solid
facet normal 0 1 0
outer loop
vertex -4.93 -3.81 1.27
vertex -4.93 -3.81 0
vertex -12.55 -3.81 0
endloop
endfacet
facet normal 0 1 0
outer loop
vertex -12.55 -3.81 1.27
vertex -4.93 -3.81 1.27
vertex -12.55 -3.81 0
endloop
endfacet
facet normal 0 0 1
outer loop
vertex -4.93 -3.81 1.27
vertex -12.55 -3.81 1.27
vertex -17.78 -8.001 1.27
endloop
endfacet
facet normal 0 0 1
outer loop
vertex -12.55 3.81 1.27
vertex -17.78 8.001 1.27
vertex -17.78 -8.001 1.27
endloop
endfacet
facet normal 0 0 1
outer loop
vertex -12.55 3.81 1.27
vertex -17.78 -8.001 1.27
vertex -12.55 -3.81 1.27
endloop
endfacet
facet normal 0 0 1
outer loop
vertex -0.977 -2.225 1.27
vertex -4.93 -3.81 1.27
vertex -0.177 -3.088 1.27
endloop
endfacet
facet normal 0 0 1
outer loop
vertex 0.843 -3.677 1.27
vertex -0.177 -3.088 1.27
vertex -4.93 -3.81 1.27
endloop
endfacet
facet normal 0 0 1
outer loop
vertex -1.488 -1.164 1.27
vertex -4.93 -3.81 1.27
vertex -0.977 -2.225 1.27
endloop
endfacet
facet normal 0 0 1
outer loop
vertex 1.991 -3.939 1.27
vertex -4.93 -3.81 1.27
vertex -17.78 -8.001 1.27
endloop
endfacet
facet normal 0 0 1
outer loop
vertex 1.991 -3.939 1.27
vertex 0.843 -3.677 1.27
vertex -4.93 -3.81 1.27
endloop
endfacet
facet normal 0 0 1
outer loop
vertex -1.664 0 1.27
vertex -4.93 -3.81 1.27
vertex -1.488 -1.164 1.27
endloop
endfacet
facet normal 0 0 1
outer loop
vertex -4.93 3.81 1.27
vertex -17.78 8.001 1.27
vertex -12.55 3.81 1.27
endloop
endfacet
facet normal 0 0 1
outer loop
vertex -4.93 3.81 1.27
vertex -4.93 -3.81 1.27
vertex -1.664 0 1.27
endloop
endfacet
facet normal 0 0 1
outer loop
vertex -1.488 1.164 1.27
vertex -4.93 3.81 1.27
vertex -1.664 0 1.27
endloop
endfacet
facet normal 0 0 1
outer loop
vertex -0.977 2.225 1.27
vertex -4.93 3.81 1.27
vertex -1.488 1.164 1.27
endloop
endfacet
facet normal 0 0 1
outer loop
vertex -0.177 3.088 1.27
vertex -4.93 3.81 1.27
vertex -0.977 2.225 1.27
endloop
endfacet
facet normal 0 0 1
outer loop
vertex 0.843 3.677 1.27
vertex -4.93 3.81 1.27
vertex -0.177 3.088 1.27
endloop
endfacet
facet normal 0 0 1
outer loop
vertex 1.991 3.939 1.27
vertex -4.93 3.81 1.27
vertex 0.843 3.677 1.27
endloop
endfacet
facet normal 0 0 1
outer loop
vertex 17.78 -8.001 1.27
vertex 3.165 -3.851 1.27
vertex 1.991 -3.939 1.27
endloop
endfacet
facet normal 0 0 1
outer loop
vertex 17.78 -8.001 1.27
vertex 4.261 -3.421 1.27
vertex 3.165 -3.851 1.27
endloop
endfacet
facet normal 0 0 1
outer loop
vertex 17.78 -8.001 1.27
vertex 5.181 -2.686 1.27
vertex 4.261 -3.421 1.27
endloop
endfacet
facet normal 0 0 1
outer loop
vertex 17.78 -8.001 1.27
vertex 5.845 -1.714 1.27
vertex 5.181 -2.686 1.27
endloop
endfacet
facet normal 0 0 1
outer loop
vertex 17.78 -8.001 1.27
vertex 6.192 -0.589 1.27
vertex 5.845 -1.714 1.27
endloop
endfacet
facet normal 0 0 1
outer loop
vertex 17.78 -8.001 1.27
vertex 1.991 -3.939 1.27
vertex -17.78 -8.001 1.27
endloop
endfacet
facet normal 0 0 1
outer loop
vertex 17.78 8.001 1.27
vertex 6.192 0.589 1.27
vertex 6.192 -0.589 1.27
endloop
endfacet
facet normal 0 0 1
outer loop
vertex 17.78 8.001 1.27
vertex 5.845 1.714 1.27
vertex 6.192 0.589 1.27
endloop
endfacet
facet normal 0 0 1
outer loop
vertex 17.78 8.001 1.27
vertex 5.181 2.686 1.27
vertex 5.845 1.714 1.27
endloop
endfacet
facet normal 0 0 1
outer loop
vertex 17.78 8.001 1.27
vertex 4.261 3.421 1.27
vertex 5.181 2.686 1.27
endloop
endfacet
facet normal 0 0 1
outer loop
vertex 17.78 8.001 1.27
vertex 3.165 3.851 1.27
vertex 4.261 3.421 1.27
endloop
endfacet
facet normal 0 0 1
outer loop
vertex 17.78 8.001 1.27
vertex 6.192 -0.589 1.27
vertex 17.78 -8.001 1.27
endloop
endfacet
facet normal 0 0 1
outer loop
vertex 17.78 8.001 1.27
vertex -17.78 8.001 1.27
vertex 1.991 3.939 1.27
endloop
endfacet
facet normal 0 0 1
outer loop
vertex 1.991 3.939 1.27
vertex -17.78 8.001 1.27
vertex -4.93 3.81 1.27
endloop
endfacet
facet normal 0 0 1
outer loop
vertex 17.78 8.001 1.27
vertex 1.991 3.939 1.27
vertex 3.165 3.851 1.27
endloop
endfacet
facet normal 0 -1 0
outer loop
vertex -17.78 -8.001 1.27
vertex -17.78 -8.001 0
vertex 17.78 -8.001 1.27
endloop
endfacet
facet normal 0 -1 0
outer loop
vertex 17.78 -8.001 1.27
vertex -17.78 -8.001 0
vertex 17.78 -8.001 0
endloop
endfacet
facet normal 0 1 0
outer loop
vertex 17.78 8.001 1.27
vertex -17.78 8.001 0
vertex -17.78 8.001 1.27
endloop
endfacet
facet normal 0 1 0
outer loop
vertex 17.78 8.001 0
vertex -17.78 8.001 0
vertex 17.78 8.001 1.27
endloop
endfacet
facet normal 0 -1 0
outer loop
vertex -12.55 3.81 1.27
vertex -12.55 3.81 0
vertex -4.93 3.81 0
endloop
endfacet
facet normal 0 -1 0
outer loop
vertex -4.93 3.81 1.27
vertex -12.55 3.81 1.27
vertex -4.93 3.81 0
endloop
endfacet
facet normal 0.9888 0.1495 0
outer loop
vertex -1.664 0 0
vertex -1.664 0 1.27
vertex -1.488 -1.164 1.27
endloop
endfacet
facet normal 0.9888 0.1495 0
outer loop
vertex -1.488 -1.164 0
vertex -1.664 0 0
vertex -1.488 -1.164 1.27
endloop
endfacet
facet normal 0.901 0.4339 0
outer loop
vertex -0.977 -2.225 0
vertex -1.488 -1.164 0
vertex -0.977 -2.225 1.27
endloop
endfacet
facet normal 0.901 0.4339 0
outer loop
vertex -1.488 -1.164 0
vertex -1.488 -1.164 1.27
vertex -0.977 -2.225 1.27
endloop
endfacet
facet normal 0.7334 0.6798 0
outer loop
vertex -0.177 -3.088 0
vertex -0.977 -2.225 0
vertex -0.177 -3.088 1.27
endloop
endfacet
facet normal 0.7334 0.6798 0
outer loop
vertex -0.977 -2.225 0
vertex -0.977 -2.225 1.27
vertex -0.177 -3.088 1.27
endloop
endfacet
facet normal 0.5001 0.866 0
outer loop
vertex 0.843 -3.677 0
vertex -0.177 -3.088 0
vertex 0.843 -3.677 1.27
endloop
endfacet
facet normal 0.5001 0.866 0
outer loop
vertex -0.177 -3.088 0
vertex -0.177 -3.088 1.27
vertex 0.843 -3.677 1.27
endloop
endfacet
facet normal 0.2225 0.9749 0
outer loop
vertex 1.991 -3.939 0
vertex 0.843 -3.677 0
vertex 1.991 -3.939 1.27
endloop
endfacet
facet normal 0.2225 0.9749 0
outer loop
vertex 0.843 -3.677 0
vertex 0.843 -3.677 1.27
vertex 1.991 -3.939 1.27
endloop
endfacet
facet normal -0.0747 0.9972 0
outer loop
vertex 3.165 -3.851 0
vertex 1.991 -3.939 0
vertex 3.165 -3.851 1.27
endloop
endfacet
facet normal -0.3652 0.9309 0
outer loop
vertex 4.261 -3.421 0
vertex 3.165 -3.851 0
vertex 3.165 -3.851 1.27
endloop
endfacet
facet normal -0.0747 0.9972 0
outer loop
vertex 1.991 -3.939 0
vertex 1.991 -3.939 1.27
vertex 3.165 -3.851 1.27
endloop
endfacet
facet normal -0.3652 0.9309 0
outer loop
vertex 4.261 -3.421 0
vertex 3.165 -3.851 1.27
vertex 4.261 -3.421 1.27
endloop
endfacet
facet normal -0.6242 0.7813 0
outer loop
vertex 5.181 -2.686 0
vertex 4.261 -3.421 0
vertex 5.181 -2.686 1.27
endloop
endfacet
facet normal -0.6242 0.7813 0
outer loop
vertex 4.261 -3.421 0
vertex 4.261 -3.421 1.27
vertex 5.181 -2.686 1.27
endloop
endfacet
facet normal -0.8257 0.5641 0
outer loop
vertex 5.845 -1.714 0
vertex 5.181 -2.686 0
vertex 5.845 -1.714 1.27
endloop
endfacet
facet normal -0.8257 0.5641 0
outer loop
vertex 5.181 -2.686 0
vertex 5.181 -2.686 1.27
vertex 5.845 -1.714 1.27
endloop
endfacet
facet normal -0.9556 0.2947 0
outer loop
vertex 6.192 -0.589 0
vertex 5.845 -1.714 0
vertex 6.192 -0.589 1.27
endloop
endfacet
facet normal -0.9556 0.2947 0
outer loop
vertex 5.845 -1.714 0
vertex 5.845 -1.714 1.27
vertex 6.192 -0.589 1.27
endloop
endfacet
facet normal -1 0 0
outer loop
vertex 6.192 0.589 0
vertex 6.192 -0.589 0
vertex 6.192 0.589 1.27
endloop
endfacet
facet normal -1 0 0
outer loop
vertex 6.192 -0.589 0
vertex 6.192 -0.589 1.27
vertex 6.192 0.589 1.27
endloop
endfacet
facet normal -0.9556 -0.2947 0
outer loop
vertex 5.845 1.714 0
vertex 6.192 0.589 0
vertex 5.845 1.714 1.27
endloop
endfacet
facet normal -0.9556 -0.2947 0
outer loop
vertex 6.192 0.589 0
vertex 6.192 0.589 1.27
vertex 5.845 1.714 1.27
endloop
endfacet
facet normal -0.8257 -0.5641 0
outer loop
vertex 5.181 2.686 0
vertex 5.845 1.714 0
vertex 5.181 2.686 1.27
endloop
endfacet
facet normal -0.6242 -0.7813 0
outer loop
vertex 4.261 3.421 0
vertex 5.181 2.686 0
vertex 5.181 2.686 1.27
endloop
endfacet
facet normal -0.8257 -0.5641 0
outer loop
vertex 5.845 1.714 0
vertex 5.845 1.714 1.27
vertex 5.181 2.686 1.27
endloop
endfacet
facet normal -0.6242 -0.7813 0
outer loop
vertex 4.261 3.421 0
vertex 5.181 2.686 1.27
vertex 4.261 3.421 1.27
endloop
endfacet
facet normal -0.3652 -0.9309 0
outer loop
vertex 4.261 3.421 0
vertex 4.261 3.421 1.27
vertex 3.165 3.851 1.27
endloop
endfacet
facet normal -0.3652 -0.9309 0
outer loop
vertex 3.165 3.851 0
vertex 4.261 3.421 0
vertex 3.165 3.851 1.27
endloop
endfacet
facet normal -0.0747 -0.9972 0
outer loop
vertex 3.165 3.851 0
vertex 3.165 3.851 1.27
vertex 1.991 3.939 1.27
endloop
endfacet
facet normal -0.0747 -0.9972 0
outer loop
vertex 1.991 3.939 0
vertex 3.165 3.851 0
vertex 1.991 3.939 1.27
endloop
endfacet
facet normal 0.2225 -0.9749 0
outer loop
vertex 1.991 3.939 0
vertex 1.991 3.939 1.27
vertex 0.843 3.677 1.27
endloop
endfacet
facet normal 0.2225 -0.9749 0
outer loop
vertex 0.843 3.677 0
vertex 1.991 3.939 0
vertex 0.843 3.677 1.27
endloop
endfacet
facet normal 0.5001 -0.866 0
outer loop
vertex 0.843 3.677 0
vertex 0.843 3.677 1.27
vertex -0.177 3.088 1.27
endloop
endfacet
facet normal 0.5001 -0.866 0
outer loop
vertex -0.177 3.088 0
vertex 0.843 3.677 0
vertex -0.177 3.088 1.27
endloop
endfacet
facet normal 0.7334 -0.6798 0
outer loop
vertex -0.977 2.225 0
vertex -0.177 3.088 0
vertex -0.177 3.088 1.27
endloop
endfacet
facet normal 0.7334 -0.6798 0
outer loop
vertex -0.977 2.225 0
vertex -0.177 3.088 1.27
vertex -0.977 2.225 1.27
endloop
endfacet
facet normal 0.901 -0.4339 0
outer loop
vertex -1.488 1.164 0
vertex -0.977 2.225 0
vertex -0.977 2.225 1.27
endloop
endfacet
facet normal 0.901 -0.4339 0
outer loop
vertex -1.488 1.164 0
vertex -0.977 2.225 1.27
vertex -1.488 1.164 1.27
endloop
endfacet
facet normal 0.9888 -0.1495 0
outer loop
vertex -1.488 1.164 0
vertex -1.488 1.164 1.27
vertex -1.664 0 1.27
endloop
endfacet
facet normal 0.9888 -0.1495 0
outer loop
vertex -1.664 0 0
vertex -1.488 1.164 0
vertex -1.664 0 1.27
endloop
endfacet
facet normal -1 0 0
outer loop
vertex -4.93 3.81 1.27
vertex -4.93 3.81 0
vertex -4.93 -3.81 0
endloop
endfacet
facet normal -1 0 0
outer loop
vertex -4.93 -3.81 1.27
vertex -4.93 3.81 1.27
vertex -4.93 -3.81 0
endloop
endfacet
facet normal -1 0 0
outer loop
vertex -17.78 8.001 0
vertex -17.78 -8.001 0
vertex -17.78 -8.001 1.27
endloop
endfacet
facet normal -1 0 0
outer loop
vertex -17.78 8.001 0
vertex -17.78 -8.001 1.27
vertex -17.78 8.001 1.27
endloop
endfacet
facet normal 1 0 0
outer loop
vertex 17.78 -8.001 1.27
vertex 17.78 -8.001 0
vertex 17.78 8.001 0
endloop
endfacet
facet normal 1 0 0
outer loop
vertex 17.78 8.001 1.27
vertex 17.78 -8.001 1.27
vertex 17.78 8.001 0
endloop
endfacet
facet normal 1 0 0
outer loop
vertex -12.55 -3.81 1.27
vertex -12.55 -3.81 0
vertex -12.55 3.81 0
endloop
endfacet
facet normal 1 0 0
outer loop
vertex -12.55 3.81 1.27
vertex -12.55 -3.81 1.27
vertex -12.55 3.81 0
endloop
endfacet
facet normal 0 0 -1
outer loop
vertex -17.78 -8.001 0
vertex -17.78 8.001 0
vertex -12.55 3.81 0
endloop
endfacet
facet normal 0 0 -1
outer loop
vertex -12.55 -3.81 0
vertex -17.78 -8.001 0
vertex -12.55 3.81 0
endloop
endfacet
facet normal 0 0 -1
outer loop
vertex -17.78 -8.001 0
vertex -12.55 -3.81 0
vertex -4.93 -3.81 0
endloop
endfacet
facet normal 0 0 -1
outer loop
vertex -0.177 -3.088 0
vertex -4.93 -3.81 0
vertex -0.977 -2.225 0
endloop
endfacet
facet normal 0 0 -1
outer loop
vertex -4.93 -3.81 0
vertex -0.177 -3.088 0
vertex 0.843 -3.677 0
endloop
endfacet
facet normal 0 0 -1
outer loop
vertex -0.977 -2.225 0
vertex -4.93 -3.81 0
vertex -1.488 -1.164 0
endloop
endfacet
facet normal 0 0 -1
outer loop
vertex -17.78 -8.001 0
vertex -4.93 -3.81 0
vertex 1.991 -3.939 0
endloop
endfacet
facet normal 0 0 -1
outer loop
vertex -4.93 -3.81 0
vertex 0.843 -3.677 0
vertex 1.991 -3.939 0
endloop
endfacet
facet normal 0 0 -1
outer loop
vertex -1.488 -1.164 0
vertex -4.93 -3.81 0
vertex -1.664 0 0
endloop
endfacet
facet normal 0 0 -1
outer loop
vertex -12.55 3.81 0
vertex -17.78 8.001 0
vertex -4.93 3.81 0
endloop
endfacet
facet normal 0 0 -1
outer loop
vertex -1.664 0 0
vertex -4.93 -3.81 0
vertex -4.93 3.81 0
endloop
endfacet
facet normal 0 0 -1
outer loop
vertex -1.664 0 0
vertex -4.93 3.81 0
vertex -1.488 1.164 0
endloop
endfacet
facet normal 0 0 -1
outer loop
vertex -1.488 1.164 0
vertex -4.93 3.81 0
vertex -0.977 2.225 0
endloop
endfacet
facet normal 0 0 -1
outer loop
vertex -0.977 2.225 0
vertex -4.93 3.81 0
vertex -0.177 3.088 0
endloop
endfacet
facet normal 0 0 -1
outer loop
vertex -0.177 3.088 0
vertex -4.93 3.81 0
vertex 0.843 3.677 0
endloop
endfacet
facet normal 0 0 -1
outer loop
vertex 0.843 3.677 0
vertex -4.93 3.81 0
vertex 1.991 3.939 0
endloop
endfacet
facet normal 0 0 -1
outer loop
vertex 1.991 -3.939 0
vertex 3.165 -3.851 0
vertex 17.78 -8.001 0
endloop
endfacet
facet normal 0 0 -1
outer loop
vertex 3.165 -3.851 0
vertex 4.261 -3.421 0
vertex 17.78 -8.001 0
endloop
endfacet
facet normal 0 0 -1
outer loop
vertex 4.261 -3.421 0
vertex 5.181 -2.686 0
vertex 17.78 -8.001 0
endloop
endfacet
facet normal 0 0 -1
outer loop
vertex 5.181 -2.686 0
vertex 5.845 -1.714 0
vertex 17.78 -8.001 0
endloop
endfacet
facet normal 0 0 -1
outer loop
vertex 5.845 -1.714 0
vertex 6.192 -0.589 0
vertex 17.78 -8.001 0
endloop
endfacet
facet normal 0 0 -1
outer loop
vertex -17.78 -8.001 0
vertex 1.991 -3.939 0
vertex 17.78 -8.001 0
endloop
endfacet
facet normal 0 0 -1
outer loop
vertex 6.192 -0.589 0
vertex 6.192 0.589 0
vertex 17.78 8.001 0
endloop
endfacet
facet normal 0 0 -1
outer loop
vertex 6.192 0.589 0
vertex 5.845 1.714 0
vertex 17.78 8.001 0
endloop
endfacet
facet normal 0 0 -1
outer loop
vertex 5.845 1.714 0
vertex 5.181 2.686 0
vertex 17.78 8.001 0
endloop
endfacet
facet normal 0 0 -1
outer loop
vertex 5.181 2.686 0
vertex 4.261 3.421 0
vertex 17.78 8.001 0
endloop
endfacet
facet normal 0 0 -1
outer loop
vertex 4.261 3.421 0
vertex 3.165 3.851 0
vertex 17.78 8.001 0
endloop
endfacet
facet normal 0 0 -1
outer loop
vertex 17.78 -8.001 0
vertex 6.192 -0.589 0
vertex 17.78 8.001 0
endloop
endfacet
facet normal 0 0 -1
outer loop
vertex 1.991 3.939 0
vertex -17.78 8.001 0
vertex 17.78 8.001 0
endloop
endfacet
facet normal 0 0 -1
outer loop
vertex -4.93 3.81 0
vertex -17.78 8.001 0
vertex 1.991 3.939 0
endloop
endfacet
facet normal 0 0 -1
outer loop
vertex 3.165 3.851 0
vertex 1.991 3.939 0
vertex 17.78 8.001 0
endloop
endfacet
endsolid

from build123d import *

# Parameters (mm, degrees)
F0_W     = 35.56
F0_H     = 16.002
F1_DEPTH = 1.27
F3_D     = 7.8994
F4_DEPTH = 1.271


with BuildPart() as f1:
    # F0 (on Top) → F1 (new body)
    with BuildSketch(Plane.XY):
        Rectangle(F0_W, F0_H)
    extrude(amount=F1_DEPTH)

    # F3 (through all)
    with Locations(Plane(origin=(0, 0, 0), x_dir=(1, 0, 0), z_dir=(0, 0, -1))):
        with Locations((2.286, 0)):
            Hole(F3_D / 2)

    # F2 (on face) → F4 (cut, through all)
    with BuildSketch(Plane(origin=(0, 0, 0), x_dir=(1, 0, 0), z_dir=(0, 0, -1))):
        Polygon((-12.55014, 3.81), (-12.55014, 0), (-8.74014, 0), (-4.93014, 0), (-4.93014, 3.81), align=None)
        Polygon((-8.74014, 0), (-12.55014, 0), (-12.55014, -3.81), (-4.93014, -3.81), (-4.93014, 0), align=None)
    extrude(amount=-F4_DEPTH, mode=Mode.SUBTRACT)


solid = f1.part
